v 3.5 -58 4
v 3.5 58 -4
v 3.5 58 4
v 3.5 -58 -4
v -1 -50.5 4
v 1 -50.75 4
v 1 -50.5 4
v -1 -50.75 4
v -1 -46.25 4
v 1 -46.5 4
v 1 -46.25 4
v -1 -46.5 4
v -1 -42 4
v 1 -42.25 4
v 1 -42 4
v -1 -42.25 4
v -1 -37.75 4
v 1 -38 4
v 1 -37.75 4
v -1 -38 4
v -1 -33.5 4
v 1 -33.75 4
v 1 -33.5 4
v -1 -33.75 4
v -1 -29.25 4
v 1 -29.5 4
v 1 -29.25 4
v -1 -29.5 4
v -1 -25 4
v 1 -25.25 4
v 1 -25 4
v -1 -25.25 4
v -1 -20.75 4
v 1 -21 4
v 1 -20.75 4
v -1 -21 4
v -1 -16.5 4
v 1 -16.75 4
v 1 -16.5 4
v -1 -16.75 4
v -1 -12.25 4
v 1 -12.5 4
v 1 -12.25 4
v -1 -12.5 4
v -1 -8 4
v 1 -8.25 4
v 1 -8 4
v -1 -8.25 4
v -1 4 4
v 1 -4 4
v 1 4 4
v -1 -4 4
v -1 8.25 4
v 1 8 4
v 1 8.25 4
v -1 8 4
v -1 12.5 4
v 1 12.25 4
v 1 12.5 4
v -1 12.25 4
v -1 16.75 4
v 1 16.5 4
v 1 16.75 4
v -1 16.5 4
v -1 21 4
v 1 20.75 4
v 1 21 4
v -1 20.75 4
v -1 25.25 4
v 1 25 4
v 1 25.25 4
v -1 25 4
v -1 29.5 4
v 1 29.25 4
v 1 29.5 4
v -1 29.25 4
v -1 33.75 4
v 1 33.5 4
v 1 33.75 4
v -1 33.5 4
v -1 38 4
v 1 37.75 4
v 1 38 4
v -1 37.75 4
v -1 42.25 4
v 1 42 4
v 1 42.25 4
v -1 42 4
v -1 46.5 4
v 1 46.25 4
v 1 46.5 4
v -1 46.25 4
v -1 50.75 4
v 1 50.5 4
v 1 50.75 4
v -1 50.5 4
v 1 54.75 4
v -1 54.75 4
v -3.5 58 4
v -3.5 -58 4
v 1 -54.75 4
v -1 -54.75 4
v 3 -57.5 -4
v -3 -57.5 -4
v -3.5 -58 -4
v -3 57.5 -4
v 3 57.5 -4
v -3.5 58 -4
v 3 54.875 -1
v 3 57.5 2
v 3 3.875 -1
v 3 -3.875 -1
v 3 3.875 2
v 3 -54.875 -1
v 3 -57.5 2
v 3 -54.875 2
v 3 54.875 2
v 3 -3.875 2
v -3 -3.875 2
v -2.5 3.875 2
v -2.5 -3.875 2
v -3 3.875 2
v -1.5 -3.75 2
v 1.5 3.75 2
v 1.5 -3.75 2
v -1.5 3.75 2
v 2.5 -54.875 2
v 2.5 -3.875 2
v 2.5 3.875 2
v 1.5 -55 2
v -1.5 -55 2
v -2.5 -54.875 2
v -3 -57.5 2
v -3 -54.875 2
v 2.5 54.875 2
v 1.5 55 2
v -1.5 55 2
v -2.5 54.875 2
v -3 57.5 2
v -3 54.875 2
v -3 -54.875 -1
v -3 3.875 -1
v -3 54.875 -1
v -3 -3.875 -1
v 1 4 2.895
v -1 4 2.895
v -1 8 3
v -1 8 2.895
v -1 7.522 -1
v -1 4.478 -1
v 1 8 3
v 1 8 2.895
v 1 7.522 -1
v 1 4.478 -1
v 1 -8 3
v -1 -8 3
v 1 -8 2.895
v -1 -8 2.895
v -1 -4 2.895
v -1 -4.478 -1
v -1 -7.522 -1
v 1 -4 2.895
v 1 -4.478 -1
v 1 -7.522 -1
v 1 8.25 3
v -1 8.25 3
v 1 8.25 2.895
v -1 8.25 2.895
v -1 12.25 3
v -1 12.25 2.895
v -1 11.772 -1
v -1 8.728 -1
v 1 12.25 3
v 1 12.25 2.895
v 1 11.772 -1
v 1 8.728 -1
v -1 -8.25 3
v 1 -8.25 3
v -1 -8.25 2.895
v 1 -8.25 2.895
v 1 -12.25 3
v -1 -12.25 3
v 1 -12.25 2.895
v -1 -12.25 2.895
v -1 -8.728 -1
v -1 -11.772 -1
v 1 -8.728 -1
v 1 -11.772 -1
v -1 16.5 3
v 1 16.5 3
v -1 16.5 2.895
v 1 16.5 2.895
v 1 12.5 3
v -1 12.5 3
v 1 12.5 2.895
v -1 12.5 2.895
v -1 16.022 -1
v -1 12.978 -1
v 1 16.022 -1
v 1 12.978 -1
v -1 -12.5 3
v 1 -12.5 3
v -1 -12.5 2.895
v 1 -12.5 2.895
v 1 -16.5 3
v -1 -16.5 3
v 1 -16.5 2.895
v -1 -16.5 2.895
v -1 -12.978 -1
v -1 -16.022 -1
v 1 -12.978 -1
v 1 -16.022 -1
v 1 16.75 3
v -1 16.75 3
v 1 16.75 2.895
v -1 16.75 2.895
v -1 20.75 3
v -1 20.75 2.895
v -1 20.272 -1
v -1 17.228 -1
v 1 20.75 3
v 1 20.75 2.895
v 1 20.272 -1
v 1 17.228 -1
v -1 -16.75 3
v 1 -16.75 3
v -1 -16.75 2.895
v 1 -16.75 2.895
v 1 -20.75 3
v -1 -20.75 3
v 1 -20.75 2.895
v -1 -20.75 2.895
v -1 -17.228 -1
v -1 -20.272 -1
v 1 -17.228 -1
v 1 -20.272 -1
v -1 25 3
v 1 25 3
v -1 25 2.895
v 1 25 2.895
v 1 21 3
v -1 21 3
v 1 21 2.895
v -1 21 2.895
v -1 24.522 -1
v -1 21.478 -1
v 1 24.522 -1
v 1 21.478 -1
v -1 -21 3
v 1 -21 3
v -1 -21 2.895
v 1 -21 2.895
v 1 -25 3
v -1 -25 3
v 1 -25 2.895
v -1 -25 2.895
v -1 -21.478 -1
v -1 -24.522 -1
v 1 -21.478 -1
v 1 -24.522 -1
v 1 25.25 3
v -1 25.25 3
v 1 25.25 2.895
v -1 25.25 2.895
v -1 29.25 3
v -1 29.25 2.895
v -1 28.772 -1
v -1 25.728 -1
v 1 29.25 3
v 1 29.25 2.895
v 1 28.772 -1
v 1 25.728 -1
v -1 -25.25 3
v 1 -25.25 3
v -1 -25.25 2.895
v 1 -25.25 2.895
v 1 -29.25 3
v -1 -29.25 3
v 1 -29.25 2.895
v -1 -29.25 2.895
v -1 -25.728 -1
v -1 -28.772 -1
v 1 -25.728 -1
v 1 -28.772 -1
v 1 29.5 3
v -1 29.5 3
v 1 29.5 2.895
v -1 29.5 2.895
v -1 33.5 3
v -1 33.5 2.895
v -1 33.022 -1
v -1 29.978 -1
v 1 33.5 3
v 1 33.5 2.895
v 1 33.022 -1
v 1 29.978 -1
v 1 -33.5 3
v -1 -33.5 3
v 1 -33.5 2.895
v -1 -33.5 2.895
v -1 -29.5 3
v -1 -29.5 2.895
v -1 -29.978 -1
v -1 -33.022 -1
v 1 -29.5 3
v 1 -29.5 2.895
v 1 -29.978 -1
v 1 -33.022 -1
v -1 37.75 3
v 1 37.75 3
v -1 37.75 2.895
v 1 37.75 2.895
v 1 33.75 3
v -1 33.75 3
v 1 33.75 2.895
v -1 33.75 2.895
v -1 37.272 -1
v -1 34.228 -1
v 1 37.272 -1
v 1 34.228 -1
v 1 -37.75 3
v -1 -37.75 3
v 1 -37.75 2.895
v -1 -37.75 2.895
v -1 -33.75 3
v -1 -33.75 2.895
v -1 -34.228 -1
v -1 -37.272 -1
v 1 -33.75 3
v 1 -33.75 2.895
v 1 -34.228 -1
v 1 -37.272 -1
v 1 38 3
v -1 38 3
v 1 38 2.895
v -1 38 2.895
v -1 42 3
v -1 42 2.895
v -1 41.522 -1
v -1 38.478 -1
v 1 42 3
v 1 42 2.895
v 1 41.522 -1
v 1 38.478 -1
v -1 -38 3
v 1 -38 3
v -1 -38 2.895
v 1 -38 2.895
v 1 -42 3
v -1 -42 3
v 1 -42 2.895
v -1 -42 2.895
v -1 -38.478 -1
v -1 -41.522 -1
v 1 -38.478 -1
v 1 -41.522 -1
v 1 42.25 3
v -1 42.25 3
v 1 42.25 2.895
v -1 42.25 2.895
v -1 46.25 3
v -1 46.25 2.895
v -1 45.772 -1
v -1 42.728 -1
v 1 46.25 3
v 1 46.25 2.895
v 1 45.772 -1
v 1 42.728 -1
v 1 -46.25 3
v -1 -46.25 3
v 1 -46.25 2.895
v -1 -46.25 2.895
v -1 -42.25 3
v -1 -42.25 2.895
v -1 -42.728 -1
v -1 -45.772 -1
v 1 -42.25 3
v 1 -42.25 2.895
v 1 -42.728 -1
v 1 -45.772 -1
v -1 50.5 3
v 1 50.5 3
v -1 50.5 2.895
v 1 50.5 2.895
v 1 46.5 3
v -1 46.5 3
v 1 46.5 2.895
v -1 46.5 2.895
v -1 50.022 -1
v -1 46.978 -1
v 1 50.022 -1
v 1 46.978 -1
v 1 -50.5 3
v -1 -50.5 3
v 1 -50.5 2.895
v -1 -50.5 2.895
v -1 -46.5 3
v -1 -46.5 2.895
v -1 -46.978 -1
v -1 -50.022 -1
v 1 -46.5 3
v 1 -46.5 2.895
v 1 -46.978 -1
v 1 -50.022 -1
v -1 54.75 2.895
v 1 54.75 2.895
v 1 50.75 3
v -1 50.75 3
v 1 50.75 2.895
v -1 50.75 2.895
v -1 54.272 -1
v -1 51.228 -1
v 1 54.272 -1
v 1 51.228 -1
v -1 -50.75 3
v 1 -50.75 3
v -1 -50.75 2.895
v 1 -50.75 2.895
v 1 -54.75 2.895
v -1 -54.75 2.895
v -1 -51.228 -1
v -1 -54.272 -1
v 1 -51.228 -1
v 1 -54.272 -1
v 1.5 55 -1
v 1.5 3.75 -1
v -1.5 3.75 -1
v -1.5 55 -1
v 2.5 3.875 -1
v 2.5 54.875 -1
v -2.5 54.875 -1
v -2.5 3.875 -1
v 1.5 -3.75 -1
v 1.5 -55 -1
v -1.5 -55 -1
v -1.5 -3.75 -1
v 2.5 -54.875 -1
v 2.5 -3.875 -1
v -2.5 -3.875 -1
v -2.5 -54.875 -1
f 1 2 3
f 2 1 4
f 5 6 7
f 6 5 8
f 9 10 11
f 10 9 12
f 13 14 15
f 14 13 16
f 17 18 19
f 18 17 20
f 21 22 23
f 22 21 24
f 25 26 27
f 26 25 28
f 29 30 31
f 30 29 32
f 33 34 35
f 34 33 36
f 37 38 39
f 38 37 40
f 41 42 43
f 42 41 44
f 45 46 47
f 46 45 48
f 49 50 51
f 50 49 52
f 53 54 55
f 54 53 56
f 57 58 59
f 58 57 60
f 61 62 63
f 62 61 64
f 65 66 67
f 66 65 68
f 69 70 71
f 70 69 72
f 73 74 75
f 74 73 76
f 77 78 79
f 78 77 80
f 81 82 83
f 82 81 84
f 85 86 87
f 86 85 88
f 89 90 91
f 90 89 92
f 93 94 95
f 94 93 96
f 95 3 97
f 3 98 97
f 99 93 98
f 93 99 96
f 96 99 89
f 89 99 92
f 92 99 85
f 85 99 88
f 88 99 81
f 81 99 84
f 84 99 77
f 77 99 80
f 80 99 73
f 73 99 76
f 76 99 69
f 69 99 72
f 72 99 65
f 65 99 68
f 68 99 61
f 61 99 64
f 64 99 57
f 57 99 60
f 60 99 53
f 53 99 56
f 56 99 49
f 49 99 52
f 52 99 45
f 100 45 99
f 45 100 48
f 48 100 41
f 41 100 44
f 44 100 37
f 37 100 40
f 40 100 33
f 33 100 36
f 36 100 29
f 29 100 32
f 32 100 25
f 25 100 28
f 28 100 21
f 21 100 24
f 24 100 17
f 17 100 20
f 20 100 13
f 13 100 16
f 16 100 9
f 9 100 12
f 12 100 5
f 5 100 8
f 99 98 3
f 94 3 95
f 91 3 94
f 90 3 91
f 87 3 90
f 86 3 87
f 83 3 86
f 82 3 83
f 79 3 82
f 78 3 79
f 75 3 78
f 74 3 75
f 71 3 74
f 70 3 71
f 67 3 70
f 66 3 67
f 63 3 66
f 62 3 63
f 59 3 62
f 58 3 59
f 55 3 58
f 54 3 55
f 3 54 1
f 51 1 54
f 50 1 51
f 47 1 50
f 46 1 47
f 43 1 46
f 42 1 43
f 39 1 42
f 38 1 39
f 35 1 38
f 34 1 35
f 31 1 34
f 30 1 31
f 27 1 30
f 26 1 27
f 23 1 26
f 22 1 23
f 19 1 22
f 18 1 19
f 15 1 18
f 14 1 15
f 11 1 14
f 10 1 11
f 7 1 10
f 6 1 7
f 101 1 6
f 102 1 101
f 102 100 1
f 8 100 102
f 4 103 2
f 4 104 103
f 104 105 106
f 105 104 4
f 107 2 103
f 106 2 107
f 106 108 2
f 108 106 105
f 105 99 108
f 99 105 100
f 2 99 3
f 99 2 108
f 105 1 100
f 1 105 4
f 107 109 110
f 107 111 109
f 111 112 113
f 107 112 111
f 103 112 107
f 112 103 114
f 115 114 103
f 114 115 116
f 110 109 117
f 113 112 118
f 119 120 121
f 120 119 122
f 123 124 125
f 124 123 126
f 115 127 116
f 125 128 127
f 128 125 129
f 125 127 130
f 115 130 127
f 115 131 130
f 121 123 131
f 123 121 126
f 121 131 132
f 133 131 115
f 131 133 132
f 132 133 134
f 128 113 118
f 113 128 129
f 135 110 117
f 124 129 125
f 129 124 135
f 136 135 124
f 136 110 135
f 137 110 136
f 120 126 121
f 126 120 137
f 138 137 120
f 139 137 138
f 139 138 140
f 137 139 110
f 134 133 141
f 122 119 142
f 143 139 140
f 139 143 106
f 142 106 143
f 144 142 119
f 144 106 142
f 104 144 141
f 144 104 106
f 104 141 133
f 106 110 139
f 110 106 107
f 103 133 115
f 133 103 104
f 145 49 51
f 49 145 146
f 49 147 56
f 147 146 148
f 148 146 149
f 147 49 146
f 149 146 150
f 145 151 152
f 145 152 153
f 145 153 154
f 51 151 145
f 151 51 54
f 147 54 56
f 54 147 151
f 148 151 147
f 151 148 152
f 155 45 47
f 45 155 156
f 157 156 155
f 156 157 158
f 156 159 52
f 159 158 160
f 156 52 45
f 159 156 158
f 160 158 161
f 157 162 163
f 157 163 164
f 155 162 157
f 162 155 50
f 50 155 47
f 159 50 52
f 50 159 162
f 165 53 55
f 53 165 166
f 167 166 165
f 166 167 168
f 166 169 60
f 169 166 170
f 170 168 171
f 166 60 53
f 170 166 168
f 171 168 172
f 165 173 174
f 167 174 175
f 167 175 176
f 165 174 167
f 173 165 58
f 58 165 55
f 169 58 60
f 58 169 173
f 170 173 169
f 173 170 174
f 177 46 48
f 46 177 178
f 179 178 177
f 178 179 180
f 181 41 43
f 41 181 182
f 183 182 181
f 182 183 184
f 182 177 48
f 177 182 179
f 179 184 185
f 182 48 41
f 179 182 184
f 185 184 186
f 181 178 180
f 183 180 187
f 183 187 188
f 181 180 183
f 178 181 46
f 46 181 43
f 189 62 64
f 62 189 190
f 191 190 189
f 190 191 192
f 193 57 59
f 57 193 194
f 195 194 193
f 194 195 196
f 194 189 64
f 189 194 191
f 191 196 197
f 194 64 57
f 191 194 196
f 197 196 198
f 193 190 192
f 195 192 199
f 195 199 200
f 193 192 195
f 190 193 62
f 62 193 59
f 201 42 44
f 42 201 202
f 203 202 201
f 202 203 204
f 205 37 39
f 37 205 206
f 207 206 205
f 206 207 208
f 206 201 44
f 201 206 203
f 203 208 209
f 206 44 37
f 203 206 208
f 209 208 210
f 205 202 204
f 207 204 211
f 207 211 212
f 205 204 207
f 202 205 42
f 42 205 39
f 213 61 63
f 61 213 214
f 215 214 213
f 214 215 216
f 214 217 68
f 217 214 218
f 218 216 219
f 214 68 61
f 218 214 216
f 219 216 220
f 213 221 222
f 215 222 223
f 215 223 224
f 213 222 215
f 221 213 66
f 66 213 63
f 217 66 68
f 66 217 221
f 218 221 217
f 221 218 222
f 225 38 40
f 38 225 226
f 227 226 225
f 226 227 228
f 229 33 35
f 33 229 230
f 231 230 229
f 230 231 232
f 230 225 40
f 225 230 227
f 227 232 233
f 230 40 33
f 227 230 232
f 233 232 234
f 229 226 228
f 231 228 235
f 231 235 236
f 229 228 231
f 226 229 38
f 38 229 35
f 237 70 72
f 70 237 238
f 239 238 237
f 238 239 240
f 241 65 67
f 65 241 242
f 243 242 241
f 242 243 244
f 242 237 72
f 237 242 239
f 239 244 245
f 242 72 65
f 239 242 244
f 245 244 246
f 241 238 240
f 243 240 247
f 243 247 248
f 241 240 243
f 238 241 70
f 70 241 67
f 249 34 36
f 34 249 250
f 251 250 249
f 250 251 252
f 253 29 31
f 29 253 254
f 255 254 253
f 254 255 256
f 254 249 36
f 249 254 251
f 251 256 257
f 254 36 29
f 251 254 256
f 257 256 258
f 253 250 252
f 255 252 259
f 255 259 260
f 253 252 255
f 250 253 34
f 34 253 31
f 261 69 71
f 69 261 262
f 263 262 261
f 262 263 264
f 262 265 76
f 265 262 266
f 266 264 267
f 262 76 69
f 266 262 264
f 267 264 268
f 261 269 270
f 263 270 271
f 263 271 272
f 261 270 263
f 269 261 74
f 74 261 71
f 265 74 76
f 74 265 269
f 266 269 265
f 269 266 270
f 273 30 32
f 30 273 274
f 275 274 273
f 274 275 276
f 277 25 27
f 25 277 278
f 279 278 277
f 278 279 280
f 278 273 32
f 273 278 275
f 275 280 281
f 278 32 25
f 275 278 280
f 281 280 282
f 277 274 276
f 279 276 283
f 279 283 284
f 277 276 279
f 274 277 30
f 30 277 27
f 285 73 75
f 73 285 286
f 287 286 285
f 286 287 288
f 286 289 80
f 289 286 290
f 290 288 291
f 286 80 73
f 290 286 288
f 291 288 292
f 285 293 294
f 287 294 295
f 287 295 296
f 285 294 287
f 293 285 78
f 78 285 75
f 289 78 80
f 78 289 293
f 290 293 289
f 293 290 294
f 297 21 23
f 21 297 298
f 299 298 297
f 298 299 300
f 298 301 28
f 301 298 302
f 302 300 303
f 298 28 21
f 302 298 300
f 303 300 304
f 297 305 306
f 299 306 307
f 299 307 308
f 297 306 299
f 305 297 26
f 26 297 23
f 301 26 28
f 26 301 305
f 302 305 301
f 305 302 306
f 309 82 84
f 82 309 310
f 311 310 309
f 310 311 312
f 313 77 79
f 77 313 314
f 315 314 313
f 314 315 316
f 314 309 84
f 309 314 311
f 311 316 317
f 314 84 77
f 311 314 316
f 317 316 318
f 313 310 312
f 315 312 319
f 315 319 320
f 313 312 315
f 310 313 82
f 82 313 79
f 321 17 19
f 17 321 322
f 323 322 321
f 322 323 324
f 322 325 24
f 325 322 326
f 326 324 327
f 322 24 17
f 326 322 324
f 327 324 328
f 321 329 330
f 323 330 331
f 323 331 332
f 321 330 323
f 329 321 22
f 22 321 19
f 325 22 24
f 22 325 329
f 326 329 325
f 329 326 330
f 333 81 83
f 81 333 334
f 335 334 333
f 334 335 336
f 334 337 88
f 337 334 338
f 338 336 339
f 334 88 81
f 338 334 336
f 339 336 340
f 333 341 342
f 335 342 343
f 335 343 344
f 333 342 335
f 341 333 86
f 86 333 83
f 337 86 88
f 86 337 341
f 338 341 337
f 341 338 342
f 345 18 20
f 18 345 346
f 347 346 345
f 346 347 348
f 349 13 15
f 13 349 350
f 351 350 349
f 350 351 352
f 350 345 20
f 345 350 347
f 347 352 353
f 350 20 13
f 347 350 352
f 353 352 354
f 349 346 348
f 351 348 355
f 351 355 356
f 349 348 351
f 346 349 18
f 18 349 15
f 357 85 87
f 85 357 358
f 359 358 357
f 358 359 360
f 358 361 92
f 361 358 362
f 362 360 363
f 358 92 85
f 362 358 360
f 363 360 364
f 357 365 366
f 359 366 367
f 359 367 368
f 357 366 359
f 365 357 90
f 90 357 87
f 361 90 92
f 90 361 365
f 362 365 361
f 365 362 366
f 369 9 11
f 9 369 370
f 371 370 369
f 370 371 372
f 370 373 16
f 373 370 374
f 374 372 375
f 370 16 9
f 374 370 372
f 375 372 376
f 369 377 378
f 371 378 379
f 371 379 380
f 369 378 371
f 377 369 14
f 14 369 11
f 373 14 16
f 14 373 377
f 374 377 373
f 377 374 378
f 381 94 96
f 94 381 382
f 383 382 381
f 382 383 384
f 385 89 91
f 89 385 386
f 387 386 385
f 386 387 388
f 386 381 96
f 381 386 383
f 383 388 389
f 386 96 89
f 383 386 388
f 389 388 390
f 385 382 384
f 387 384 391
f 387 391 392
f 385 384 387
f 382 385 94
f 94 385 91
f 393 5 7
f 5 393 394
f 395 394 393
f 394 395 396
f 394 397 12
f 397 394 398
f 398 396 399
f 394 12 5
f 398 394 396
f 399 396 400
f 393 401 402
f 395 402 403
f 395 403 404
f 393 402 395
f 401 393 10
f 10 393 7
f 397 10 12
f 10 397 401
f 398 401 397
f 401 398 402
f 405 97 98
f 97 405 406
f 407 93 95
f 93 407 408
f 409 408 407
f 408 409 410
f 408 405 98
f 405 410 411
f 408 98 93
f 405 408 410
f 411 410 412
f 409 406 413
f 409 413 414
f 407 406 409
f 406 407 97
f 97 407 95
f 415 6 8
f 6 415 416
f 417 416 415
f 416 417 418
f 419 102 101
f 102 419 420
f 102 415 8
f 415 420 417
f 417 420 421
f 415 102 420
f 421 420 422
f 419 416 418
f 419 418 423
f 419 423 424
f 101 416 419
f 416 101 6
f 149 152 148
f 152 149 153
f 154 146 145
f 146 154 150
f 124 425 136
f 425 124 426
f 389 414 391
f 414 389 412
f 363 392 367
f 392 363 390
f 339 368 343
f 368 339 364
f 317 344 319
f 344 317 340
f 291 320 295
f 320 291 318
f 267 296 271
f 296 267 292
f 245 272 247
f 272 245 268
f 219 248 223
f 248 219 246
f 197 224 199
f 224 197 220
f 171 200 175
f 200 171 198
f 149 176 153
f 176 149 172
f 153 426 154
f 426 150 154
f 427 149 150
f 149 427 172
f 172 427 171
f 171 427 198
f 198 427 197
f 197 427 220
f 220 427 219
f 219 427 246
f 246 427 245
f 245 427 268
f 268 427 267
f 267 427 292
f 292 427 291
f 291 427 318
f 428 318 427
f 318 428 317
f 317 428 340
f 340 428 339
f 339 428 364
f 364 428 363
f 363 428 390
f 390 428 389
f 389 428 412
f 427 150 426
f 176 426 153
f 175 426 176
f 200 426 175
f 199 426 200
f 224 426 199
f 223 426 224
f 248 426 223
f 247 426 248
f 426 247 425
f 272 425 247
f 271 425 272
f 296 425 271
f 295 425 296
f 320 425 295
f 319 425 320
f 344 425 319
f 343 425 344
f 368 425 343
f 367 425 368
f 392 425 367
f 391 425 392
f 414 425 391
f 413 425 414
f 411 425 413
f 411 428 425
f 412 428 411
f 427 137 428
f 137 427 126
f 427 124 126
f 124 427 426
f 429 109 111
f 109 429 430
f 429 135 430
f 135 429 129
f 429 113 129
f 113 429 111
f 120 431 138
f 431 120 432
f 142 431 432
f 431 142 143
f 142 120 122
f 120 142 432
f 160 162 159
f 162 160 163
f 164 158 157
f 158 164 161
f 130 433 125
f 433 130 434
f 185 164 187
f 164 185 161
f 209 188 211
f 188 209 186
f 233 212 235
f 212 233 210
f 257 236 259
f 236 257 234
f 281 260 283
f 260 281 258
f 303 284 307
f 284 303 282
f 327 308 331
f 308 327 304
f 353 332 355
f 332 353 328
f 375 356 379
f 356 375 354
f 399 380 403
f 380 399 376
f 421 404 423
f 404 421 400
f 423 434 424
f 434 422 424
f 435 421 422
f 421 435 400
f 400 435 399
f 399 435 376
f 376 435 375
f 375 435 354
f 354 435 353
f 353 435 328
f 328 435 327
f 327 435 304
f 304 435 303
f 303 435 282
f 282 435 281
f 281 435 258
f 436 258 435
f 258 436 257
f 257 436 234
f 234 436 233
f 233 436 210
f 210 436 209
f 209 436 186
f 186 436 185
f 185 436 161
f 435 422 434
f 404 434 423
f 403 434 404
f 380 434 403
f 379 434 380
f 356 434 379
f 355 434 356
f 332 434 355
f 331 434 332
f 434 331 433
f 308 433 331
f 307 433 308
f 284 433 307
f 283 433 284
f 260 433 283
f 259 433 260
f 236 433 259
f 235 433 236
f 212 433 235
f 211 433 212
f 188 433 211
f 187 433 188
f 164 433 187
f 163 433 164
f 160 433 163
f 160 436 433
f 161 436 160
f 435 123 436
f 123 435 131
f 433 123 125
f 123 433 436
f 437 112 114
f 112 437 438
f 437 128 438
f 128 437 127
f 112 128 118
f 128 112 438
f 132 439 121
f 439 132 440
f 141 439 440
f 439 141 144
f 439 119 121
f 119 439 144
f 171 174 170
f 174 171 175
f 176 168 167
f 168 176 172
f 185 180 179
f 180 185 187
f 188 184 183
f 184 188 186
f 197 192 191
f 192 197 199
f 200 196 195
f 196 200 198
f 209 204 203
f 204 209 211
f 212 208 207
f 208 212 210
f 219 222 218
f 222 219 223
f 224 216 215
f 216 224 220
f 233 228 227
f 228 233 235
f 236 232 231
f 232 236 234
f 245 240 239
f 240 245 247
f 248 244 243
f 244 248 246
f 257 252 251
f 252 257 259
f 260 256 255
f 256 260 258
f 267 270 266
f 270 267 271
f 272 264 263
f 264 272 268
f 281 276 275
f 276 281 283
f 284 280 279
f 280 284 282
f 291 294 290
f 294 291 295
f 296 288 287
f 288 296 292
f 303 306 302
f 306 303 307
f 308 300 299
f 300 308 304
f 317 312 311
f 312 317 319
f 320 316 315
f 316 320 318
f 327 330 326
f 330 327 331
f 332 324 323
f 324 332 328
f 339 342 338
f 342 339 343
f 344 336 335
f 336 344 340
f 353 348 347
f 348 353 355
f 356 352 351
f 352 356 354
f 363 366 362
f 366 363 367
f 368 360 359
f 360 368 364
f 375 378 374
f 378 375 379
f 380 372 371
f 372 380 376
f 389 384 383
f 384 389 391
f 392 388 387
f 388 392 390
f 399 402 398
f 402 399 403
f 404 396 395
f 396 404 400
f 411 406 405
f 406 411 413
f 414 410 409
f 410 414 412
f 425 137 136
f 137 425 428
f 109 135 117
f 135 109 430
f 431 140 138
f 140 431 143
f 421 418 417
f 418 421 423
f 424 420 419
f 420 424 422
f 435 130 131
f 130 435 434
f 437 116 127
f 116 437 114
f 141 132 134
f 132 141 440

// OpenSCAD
$fn=50;
$t=true;        //Abbreviation
$wth=1;         //Wall Thickness
$l=116;         //Length
$w=7;           //Width
$h=8;           //Height
$ow=4;          //LED Opening Width
$oiw=3.5;       //LED Opening Inside Width
$ol=2;          //LED Opening length
$os=.25;        //LED Opening Spacing
$ols=$ow+$os;   //Distance per LED
$olso=6;      //Offset for Center
$od=4;          //LED Opening Depth

module ledopening() {
    rotate([0,0,90]) cube([$ow,$ol,$wth*4], center=$t);
}

module ledconduit() {
    difference() {
        cube([$ol+1, $ow+$os*2, $h/2], center=$t);
        difference() {
            cube([$ol, $ow, $h/2+.1], center=$t);
            translate([0,$ol+.26,-.09]) rotate([-7,0,0]) cube([$ol, 1, $h/2+.1], center=$t);
            translate([0,-$ol-.26,-.09]) rotate([7,0,0]) cube([$ol, 1, $h/2+.1], center=$t);
        }
    }
    translate([($w/2)-$wth+.25,0,0]) cube([.5,$ols,$h/2], center=$t);
    translate([-($w/2)+$wth-.25,0,0]) cube([.5,$ols,$h/2], center=$t);
}

difference() {
    cube([$w,$l,$h], center=$t);
    translate([0,0,-$wth*2]) cube([$w-$wth,$l-$wth,$h], center=$t);
    translate([0,$olso,$h/2]) ledopening();         //LED #6
    translate([0,-$olso,$h/2]) ledopening();        //LED #7
    translate([0,$olso+$ols,$h/2]) ledopening();    //LED #5
    translate([0,-$olso-$ols,$h/2]) ledopening();   //LED #8
    translate([0,$olso+$ols*2,$h/2]) ledopening();  //LED #4
    translate([0,-$olso-$ols*2,$h/2]) ledopening(); //LED #9
    translate([0,$olso+$ols*3,$h/2]) ledopening();  //LED #3
    translate([0,-$olso-$ols*3,$h/2]) ledopening(); //LED #10
    translate([0,$olso+$ols*4,$h/2]) ledopening();  //LED #2
    translate([0,-$olso-$ols*4,$h/2]) ledopening(); //LED #11
    translate([0,$olso+$ols*5,$h/2]) ledopening();  //LED #1
    translate([0,-$olso-$ols*5,$h/2]) ledopening(); //LED #12
    translate([0,$olso+$ols*6,$h/2]) ledopening();  //LED #1
    translate([0,-$olso-$ols*6,$h/2]) ledopening(); //LED #12
    translate([0,$olso+$ols*7,$h/2]) ledopening();  //LED #1
    translate([0,-$olso-$ols*7,$h/2]) ledopening(); //LED #12
    translate([0,$olso+$ols*8,$h/2]) ledopening();  //LED #1
    translate([0,-$olso-$ols*8,$h/2]) ledopening(); //LED #12
    translate([0,$olso+$ols*9,$h/2]) ledopening();  //LED #1
    translate([0,-$olso-$ols*9,$h/2]) ledopening(); //LED #12
    translate([0,$olso+$ols*10,$h/2]) ledopening();  //LED #1
    translate([0,-$olso-$ols*10,$h/2]) ledopening(); //LED #12
    translate([0,$olso+$ols*11,$h/2]) ledopening();  //LED #1
    translate([0,-$olso-$ols*11,$h/2]) ledopening(); //LED #12
}
//translate([0,$olso,$h]) ledconduit();
translate([0,$olso,1]) ledconduit();                //LED Conduit #6
translate([0,-$olso,1]) ledconduit();               //LED Conduit #7
translate([0,$olso+$ols,1]) ledconduit();           //LED Conduit #5
translate([0,-$olso-$ols,1]) ledconduit();          //LED Conduit #8
translate([0,$olso+$ols*2,1]) ledconduit();         //LED Conduit #4
translate([0,-$olso-$ols*2,1]) ledconduit();        //LED Conduit #9
translate([0,$olso+$ols*3,1]) ledconduit();         //LED Conduit #3
translate([0,-$olso-$ols*3,1]) ledconduit();        //LED Conduit #10
translate([0,$olso+$ols*4,1]) ledconduit();         //LED Conduit #2
translate([0,-$olso-$ols*4,1]) ledconduit();        //LED Conduit #11
translate([0,$olso+$ols*5,1]) ledconduit();         //LED Conduit #1
translate([0,-$olso-$ols*5,1]) ledconduit();        //LED Conduit #12
translate([0,$olso+$ols*6,1]) ledconduit();         //LED Conduit #1
translate([0,-$olso-$ols*6,1]) ledconduit();        //LED Conduit #12
translate([0,$olso+$ols*7,1]) ledconduit();         //LED Conduit #1
translate([0,-$olso-$ols*7,1]) ledconduit();        //LED Conduit #12
translate([0,$olso+$ols*8,1]) ledconduit();         //LED Conduit #1
translate([0,-$olso-$ols*8,1]) ledconduit();        //LED Conduit #12
translate([0,$olso+$ols*9,1]) ledconduit();         //LED Conduit #1
translate([0,-$olso-$ols*9,1]) ledconduit();        //LED Conduit #12
translate([0,$olso+$ols*10,1]) ledconduit();         //LED Conduit #1
translate([0,-$olso-$ols*10,1]) ledconduit();        //LED Conduit #12
translate([0,$olso+$ols*11,1]) ledconduit();         //LED Conduit #1
translate([0,-$olso-$ols*11,1]) ledconduit();        //LED Conduit #12
